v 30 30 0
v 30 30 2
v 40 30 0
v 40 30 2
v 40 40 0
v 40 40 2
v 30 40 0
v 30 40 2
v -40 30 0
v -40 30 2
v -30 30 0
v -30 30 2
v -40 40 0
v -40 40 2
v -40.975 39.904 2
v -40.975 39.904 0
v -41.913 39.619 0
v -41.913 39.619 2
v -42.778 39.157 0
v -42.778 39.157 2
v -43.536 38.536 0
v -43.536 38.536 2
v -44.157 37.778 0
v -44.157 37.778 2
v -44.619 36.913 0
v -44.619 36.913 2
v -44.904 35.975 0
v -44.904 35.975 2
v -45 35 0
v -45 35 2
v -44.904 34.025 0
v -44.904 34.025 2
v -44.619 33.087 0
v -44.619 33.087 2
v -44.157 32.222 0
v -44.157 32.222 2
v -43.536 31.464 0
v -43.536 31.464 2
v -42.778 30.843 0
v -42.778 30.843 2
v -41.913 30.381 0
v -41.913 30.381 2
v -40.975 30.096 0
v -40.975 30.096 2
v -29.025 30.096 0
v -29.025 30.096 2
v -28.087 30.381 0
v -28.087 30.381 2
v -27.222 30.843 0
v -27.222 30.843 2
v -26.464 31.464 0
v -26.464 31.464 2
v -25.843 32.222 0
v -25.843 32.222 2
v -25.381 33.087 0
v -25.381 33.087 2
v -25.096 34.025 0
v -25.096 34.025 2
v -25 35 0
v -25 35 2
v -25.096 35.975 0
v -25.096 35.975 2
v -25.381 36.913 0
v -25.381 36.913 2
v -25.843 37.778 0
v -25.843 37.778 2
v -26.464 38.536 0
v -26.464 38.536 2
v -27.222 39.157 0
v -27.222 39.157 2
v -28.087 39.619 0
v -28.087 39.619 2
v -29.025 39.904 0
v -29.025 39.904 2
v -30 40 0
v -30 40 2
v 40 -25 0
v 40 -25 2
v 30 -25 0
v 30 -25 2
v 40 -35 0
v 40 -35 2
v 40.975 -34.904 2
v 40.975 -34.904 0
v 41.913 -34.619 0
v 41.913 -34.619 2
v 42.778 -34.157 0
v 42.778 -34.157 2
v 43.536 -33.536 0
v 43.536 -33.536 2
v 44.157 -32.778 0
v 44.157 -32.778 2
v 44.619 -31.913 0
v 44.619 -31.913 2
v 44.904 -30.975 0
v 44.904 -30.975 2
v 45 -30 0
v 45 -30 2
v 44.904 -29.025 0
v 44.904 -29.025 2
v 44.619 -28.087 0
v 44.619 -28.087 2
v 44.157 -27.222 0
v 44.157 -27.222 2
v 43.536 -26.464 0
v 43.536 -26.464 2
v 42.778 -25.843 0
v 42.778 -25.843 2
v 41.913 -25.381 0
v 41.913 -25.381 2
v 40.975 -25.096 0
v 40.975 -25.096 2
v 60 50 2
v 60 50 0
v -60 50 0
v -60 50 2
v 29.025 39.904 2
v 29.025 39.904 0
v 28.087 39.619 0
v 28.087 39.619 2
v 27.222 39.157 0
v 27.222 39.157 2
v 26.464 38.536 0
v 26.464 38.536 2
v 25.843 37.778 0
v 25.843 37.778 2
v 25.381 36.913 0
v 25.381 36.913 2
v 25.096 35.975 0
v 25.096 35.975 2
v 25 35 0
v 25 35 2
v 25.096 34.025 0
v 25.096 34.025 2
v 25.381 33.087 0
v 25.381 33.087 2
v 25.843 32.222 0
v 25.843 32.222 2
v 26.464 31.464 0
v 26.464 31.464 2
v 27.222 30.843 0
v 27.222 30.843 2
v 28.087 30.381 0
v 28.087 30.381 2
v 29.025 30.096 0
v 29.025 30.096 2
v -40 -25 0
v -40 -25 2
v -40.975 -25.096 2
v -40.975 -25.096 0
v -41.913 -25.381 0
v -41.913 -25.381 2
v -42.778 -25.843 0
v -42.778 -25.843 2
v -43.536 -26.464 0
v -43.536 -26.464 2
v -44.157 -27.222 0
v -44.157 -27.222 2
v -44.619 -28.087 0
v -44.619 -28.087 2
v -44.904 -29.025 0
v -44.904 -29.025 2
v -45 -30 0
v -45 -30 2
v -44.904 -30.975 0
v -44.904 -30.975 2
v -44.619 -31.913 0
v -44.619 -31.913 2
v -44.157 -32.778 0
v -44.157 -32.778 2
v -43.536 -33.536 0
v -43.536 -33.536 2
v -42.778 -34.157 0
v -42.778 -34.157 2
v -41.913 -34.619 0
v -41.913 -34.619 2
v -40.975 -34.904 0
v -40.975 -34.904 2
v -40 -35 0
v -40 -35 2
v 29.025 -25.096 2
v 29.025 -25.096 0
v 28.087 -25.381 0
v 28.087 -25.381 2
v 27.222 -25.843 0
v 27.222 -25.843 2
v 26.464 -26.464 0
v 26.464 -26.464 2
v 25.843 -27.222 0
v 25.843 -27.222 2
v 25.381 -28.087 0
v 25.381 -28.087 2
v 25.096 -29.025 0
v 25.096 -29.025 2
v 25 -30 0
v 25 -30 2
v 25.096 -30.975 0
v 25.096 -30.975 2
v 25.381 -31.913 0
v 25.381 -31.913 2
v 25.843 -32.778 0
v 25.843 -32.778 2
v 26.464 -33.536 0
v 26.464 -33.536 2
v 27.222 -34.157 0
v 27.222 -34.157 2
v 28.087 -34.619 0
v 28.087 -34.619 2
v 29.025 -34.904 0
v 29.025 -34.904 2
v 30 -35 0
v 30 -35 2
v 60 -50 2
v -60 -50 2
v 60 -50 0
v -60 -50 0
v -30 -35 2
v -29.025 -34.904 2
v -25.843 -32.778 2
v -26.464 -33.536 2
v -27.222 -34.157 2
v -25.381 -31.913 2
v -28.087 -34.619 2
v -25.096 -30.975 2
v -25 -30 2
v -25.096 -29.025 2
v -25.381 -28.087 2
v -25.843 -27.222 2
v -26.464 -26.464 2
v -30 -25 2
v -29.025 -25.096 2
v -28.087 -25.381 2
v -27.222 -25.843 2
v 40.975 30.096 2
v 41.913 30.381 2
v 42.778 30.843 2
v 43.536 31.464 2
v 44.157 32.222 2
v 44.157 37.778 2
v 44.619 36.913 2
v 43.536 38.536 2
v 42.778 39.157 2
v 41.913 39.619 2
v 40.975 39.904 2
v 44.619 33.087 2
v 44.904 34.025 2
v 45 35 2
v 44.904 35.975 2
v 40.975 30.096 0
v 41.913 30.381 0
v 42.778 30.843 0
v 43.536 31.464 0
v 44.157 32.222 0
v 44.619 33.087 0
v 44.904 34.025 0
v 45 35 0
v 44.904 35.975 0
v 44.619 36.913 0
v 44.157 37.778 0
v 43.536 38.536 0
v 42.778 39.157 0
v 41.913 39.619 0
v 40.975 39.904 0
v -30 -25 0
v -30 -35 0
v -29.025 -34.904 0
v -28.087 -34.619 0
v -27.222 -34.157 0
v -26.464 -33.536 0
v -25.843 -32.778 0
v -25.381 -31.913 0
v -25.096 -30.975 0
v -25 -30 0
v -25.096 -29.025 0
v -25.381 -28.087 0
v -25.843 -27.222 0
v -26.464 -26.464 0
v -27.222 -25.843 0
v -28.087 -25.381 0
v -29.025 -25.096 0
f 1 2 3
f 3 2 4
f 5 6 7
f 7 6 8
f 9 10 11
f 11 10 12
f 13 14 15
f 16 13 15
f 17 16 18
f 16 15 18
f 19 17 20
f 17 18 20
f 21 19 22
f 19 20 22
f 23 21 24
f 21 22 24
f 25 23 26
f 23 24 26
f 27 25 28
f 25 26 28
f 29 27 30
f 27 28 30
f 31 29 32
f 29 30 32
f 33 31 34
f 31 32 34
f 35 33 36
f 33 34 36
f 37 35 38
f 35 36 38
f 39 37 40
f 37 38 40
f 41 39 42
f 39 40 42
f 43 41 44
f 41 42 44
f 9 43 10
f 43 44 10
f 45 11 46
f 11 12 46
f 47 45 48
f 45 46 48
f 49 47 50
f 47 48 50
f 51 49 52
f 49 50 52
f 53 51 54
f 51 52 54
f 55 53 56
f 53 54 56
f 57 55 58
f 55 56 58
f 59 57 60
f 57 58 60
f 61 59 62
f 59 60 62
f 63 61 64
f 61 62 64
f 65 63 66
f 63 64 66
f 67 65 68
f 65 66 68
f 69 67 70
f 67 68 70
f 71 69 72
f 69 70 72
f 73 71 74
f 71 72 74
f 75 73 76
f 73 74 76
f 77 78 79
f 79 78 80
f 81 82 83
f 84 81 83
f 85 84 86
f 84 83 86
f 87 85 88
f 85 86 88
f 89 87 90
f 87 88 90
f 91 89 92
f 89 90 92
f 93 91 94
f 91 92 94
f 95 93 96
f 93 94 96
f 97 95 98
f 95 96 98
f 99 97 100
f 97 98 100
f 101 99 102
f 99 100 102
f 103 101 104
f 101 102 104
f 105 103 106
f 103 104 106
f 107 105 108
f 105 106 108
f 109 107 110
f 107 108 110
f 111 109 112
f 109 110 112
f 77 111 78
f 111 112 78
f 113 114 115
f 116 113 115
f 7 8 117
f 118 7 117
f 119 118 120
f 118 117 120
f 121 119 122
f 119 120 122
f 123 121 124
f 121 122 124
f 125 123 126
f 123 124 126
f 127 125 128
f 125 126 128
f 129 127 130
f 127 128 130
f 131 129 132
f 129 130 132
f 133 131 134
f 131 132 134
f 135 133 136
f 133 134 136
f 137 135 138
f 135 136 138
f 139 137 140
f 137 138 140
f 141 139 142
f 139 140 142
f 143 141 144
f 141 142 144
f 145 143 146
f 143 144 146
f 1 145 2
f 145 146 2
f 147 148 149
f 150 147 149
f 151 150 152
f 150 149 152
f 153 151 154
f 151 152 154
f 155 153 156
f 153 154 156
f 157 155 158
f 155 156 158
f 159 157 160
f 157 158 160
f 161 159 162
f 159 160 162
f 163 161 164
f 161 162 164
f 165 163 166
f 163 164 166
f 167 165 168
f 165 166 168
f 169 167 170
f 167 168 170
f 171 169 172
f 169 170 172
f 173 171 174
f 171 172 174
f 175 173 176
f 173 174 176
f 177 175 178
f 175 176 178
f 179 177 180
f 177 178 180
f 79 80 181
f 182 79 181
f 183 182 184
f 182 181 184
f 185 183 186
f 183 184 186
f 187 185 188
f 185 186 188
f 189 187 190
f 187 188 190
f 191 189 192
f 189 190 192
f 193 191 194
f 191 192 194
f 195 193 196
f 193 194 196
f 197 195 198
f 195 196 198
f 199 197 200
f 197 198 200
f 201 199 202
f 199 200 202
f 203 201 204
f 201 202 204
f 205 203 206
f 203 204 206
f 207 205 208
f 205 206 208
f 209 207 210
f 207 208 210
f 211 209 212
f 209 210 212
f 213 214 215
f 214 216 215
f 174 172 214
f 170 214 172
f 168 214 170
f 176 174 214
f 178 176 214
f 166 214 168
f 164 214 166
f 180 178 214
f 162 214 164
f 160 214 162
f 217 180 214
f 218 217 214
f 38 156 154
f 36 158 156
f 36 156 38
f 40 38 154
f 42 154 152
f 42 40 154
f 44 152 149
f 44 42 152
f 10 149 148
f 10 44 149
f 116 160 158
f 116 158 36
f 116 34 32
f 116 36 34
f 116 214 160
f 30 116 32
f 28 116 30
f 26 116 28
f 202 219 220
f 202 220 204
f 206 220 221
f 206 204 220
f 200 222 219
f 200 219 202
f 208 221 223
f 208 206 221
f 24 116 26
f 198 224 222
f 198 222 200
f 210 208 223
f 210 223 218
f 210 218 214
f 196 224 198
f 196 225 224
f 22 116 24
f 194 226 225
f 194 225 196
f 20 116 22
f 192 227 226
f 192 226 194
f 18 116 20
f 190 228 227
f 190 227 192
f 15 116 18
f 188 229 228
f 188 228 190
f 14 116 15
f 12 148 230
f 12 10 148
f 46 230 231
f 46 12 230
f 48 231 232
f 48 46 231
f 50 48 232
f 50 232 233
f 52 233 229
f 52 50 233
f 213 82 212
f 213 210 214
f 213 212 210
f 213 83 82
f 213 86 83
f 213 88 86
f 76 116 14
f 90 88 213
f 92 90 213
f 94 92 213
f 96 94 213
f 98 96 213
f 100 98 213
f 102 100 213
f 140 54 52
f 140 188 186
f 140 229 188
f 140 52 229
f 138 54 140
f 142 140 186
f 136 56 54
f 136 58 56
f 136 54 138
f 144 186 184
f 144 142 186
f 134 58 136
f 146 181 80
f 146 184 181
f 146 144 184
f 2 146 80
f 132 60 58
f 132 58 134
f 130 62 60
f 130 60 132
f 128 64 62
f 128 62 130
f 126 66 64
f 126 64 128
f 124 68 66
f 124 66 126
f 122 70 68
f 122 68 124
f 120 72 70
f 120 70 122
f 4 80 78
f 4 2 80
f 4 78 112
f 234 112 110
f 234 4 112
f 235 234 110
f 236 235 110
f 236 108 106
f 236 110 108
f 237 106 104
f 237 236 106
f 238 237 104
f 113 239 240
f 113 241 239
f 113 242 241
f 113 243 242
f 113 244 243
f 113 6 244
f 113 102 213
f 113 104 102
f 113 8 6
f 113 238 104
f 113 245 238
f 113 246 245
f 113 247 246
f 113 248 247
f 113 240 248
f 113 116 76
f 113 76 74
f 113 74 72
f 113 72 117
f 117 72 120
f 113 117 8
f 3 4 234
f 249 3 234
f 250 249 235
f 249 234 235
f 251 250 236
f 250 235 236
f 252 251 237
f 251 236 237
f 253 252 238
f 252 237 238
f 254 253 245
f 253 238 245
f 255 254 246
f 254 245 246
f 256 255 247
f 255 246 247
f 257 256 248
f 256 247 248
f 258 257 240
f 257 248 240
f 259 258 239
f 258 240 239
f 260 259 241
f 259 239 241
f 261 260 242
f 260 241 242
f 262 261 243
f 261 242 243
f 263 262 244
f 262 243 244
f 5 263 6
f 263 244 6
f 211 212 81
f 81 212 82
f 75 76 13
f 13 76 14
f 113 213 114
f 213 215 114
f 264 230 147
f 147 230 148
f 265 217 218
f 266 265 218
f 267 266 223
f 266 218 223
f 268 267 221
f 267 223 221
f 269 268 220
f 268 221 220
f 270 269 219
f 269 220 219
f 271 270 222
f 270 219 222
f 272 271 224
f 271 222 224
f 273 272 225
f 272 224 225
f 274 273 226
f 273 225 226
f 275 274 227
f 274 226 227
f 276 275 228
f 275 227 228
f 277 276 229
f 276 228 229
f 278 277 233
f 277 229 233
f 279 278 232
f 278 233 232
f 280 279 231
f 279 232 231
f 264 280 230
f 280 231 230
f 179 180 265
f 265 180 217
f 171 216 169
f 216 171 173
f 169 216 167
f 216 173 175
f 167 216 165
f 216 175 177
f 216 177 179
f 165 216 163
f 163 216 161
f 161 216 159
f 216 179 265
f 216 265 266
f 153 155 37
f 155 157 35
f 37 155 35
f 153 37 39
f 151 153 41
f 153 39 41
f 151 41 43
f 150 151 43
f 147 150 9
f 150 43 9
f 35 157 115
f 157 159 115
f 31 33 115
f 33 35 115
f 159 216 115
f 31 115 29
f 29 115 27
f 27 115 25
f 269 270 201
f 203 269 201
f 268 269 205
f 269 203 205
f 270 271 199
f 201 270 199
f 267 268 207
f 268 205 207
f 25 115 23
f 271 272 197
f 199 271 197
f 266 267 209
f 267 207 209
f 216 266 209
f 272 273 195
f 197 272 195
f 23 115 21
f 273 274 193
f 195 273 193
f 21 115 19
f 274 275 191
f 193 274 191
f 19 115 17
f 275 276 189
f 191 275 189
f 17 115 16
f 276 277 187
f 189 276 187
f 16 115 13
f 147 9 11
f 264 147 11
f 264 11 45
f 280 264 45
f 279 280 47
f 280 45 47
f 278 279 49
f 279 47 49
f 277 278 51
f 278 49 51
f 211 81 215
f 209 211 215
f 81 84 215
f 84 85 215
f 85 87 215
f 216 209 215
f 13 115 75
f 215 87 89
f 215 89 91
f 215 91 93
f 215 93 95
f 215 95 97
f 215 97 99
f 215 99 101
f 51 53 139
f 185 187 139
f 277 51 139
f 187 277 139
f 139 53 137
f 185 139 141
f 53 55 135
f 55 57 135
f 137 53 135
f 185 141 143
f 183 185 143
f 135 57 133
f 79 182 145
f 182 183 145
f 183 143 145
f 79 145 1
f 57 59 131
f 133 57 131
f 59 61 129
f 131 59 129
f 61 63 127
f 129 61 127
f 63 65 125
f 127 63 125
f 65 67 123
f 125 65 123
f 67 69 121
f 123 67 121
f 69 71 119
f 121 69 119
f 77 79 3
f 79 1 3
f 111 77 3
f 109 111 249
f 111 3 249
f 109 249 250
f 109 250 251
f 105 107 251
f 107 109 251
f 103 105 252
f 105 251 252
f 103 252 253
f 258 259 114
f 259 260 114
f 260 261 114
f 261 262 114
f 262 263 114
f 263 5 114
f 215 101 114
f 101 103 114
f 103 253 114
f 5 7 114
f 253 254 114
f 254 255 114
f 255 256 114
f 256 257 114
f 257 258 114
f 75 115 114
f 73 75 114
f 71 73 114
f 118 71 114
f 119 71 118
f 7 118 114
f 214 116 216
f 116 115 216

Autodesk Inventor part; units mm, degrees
ref_plane "YZ Plane" through (0, 0, 0) normal (1, 0, 0) x (0, 1, 0)
ref_plane "XZ Plane" through (0, 0, 0) normal (0, 1, 0) x (-1, 0, 0)
ref_plane "XY Plane" through (0, 0, 0) normal (0, 0, 1) x (1, 0, 0)
sketch "Sketch1" plane through (0, 0, 0) normal (0, 0, 1) x (1, 0, 0)
  line L0 (-60, -50) -> (60, -50)
  line L1 (60, -50) -> (60, 50)
  line L2 (60, 50) -> (-60, 50)
  line L3 (-60, 50) -> (-60, -50)
  line L4 (-60, -50) -> (60, 50) construction
  line L5 (60, -50) -> (-60, 50) construction
  line L6 (-60, 0) -> (60, 0) construction
  line L7 (23.5369, 32.6987) -> (33.5369, 32.6987) construction
  line L8 (23.5369, 27.6987) -> (33.5369, 27.6987)
  line L9 (33.5369, 37.6987) -> (23.5369, 37.6987)
  arc A0 (23.5369, 37.6987) -> (23.5369, 27.6987) centre (23.5369, 32.6987) ccw
  arc A1 (33.5369, 27.6987) -> (33.5369, 37.6987) centre (33.5369, 32.6987) ccw
  point P0 (0, 0)
  point P1 (0, 0)
  point P2 (60, 26.1659)
  point P3 (-14.7466, -50)
  point P4 (28.5369, 32.6987)
  dimension "d0" = 120
  dimension "d1" = 100
  dimension "d17" = 5
  dimension "d18" = 10
extrude "Plate1" add sketch "Sketch1" along normal blind 2 contours L3 L2 L1 L0 | A0 L9 A1 L8
sketch "Sketch2" plane through (0, 0, 0) normal (0, 0, -1) x (-1, 0, 0)
  line L0 (-40, 30) -> (160, 30) construction
  line L1 (160, 30) -> (160, 10) construction
  line L2 (160, 10) -> (-40, 10) construction
  line L3 (-40, 10) -> (-40, 30) construction
  line L4 (-60, 50) -> (60, 50) projected
  line L5 (-60, -50) -> (-60, 50) projected
  point P0 (0, 0)
  point P1 (-48, 100)
  point P2 (-50, 98)
  point P3 (40, 70)
  point P4 (-60, 26.6315)
  dimension "d6" = 200
  dimension "d9" = 20
  dimension "d10" = 20
  dimension "d11" = 20
mark "Mark1"
sketch "Sketch3" plane through (0, 0, 2) normal (0, 0, 1) x (1, 0, 0)
  line L0 (60, -50) -> (-60, -50) projected
  line L1 (60, 50) -> (60, -50) projected
  line L2 (-60, 50) -> (60, 50) projected
  line L3 (-60, -50) -> (-60, 50) projected
  line L4 (30, 35) -> (40, 35) construction
  line L5 (30, 30) -> (40, 30)
  line L6 (40, 40) -> (30, 40)
  arc A0 (30, 40) -> (30, 30) centre (30, 35) ccw
  arc A1 (40, 30) -> (40, 40) centre (40, 35) ccw
  point P0 (0, 0)
  point P1 (35, 35)
  dimension "d19" = 5
  dimension "d20" = 10
  dimension "d21" = 15
  dimension "d22" = 25
extrude "Cut1" cut sketch "Sketch3" against normal blind 2 contours A0 L6 A1 L5
pattern_linear "Rectangular Pattern1" count 2 spacing 65 along (0, -1, 0) count 2 spacing 70 along (-1, 0, 0) of "Cut1"
equation "\"d23\" = Thickness"
equation "\"d2\" = Thickness"
equation "\"BendReliefWidth\" = Thickness"
equation "\"BendReliefDepth\" = 0.5 * Thickness"
equation "\"CornerReliefSize\" = 4 * Thickness"
equation "\"MinimumRemnant\" = 2 * Thickness"
equation "\"TransitionRadius\" = BendRadius"
equation "\"JacobiRadiusSize\" = BendRadius"
equation "\"GapSize\" = Thickness"
equation "\"Thickness\" = 2"
equation "\"BendRadius\" = 2.75"
properties part number "TRM 035 motor pillar 2" material "AISI 304"
